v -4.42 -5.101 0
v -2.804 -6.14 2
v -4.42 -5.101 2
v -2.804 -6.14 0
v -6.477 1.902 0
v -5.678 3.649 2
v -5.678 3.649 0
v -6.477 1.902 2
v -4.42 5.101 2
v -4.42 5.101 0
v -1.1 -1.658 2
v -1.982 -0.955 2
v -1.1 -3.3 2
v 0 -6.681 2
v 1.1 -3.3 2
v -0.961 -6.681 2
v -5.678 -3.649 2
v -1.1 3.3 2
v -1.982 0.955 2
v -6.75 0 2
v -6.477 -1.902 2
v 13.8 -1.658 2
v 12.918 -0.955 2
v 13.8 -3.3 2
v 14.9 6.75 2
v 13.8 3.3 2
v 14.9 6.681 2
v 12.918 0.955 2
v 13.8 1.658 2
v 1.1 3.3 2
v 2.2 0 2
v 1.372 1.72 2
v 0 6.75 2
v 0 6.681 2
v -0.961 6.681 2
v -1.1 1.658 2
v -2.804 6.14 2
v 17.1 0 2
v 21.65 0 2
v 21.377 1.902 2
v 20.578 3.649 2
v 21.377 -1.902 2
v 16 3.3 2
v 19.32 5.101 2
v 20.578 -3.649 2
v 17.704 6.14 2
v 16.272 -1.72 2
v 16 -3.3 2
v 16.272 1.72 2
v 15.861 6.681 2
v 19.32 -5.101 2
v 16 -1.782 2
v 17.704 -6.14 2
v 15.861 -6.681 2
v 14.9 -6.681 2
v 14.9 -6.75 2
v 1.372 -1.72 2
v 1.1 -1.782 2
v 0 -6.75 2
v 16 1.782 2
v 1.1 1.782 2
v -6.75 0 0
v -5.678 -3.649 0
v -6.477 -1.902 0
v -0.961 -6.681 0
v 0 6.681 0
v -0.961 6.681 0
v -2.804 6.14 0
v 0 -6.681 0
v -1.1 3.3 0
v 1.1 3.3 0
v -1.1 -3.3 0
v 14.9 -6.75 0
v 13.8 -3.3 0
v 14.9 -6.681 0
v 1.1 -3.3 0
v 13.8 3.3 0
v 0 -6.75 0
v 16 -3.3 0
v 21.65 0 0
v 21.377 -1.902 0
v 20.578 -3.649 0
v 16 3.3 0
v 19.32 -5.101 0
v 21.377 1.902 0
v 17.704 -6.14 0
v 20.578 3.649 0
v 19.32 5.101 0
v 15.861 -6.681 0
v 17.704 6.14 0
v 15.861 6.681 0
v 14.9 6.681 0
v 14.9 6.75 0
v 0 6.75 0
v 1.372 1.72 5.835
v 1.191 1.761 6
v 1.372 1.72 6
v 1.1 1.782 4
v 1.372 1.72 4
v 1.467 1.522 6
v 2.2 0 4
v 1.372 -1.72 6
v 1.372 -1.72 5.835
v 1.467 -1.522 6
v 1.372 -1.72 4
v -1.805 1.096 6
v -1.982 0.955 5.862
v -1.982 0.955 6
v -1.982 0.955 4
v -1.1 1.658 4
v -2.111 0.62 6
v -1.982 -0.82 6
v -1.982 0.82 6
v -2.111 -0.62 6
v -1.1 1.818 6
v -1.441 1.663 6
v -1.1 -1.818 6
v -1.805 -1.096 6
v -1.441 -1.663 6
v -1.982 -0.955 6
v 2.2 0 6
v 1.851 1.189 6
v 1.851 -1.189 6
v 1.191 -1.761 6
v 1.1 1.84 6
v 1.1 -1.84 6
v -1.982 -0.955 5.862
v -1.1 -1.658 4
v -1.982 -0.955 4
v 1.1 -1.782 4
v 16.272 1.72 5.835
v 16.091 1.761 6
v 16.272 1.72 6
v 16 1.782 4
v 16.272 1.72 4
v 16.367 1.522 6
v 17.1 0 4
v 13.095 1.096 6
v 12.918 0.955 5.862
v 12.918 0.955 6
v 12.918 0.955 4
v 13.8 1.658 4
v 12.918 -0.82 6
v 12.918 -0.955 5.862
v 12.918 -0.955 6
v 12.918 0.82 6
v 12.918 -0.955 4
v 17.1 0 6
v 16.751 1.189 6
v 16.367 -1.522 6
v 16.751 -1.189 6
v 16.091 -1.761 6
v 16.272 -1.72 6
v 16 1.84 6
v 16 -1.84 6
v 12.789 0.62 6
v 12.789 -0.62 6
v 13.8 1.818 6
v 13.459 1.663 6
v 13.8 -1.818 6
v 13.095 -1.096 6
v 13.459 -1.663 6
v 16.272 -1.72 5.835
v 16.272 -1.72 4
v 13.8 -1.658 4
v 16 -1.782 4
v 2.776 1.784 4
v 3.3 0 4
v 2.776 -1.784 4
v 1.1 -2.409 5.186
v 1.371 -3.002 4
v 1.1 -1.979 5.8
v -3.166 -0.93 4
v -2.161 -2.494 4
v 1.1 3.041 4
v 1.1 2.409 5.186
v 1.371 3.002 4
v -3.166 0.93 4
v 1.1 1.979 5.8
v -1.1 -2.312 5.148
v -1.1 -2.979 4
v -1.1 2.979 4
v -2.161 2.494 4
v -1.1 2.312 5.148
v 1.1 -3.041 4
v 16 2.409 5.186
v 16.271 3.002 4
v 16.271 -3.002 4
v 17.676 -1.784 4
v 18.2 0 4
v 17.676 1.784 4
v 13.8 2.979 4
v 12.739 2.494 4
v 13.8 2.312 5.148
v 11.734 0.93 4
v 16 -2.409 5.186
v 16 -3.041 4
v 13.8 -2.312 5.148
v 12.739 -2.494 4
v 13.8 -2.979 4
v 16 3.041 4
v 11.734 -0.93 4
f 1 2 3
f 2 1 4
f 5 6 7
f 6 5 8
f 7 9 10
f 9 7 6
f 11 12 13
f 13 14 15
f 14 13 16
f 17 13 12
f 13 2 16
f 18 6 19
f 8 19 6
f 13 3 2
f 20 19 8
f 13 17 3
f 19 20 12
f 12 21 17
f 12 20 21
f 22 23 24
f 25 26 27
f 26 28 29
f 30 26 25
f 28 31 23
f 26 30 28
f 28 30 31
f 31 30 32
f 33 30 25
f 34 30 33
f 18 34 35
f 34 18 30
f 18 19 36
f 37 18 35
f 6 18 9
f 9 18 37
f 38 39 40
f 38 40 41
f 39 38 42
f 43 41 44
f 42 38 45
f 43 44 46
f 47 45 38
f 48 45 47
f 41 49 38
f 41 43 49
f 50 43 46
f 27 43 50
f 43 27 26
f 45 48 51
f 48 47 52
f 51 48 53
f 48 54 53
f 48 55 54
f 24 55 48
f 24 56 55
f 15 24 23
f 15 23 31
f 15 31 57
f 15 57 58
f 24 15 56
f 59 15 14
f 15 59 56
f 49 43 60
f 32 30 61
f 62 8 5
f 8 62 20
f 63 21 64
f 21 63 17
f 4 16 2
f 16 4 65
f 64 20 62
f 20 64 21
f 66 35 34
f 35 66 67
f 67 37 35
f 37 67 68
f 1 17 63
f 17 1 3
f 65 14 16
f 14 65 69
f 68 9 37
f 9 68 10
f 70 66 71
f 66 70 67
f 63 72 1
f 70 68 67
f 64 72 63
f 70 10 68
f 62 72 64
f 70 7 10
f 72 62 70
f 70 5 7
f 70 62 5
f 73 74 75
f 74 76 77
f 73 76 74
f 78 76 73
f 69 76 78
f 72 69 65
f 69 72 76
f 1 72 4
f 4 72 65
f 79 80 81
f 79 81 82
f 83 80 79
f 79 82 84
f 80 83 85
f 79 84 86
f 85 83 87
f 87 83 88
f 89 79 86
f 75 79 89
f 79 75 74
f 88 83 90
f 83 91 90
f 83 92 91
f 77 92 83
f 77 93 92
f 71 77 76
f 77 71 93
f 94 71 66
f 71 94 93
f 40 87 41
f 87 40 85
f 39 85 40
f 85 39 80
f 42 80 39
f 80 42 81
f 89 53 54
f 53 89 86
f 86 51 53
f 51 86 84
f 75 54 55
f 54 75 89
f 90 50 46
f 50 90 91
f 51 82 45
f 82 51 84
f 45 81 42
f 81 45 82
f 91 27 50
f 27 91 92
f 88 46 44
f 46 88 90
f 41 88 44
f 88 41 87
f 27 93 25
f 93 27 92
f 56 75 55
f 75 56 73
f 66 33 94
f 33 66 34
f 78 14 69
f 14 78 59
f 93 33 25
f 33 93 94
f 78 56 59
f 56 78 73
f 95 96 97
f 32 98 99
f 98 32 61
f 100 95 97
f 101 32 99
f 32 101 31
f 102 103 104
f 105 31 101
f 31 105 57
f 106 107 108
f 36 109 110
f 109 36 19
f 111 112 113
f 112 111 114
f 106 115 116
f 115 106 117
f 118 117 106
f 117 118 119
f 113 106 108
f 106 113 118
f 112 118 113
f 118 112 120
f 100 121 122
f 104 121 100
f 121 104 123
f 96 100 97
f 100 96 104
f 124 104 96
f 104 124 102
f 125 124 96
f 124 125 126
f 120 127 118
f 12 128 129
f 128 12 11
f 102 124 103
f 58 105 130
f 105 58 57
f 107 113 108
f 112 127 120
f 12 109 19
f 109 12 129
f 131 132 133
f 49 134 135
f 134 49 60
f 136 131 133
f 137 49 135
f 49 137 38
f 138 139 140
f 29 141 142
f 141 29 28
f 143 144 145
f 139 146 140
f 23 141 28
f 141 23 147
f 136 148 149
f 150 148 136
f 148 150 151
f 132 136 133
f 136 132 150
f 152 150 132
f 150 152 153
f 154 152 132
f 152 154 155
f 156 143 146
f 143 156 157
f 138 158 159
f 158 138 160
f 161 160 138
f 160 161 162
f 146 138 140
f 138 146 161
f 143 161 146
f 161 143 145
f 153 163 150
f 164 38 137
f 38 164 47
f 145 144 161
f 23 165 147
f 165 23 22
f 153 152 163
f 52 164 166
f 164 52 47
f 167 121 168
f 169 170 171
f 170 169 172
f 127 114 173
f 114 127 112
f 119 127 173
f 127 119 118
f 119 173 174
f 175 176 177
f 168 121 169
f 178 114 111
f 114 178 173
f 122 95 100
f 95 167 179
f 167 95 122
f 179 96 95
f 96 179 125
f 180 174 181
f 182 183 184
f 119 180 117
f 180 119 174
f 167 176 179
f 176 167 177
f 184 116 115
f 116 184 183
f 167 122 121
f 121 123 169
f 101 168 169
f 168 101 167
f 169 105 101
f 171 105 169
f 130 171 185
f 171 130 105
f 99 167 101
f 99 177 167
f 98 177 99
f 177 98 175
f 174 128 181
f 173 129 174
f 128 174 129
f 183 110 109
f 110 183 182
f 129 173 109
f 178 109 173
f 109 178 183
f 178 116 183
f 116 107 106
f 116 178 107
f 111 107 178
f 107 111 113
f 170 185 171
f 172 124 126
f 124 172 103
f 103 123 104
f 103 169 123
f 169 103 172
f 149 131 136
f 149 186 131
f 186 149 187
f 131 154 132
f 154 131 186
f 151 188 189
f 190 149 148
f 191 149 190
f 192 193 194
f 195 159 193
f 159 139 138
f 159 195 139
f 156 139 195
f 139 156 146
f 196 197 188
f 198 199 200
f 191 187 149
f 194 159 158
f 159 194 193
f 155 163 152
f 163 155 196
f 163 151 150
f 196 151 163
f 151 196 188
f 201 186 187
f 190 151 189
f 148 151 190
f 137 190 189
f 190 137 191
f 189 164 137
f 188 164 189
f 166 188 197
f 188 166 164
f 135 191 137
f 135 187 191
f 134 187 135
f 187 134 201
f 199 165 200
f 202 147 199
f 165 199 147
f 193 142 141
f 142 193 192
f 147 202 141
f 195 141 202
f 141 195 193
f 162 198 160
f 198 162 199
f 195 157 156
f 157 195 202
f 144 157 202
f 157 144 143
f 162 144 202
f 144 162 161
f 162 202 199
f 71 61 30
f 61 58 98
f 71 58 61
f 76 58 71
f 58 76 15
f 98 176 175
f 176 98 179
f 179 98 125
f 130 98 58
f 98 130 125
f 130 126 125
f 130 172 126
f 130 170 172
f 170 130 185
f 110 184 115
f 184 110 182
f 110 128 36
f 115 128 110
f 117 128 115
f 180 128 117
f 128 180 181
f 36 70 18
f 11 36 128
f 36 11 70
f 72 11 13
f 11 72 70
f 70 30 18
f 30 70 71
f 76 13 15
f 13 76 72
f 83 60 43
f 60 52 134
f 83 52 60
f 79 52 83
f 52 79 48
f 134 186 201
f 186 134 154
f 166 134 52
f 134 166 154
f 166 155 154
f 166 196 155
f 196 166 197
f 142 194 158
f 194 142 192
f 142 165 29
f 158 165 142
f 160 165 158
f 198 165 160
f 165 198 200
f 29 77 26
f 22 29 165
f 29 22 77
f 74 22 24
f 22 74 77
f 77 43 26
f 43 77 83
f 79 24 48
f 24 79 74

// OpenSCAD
T = 2;

d1 = 4.4;
d2 = 13.5;

l = 10.5 + d1;

difference() {
        union() {
                cylinder(h = T, d = d2);
                translate([l, 0, 0]) cylinder(h = T, d = d2);
                translate([0, -d2/2, 0]) cube([l, d2, T]);
                cylinder(h = 3*T, d = d1);
                translate([l, 0, 0]) cylinder(h = 3*T, d = d1);

                translate([0, 0, 2*T]) cylinder(h = T, d1 = 3*d1/2, d2 = d1);
                translate([l, 0, 2*T]) cylinder(h = T, d1 = 3*d1/2, d2 = d1);
        }

        translate([-d1/4, -3*d1/4, 0]) cube([d1/2, 3*d1/2, 3*T]);
        translate([l-d1/4, -3*d1/4, 0]) cube([d1/2, 3*d1/2, 3*T]);
}
